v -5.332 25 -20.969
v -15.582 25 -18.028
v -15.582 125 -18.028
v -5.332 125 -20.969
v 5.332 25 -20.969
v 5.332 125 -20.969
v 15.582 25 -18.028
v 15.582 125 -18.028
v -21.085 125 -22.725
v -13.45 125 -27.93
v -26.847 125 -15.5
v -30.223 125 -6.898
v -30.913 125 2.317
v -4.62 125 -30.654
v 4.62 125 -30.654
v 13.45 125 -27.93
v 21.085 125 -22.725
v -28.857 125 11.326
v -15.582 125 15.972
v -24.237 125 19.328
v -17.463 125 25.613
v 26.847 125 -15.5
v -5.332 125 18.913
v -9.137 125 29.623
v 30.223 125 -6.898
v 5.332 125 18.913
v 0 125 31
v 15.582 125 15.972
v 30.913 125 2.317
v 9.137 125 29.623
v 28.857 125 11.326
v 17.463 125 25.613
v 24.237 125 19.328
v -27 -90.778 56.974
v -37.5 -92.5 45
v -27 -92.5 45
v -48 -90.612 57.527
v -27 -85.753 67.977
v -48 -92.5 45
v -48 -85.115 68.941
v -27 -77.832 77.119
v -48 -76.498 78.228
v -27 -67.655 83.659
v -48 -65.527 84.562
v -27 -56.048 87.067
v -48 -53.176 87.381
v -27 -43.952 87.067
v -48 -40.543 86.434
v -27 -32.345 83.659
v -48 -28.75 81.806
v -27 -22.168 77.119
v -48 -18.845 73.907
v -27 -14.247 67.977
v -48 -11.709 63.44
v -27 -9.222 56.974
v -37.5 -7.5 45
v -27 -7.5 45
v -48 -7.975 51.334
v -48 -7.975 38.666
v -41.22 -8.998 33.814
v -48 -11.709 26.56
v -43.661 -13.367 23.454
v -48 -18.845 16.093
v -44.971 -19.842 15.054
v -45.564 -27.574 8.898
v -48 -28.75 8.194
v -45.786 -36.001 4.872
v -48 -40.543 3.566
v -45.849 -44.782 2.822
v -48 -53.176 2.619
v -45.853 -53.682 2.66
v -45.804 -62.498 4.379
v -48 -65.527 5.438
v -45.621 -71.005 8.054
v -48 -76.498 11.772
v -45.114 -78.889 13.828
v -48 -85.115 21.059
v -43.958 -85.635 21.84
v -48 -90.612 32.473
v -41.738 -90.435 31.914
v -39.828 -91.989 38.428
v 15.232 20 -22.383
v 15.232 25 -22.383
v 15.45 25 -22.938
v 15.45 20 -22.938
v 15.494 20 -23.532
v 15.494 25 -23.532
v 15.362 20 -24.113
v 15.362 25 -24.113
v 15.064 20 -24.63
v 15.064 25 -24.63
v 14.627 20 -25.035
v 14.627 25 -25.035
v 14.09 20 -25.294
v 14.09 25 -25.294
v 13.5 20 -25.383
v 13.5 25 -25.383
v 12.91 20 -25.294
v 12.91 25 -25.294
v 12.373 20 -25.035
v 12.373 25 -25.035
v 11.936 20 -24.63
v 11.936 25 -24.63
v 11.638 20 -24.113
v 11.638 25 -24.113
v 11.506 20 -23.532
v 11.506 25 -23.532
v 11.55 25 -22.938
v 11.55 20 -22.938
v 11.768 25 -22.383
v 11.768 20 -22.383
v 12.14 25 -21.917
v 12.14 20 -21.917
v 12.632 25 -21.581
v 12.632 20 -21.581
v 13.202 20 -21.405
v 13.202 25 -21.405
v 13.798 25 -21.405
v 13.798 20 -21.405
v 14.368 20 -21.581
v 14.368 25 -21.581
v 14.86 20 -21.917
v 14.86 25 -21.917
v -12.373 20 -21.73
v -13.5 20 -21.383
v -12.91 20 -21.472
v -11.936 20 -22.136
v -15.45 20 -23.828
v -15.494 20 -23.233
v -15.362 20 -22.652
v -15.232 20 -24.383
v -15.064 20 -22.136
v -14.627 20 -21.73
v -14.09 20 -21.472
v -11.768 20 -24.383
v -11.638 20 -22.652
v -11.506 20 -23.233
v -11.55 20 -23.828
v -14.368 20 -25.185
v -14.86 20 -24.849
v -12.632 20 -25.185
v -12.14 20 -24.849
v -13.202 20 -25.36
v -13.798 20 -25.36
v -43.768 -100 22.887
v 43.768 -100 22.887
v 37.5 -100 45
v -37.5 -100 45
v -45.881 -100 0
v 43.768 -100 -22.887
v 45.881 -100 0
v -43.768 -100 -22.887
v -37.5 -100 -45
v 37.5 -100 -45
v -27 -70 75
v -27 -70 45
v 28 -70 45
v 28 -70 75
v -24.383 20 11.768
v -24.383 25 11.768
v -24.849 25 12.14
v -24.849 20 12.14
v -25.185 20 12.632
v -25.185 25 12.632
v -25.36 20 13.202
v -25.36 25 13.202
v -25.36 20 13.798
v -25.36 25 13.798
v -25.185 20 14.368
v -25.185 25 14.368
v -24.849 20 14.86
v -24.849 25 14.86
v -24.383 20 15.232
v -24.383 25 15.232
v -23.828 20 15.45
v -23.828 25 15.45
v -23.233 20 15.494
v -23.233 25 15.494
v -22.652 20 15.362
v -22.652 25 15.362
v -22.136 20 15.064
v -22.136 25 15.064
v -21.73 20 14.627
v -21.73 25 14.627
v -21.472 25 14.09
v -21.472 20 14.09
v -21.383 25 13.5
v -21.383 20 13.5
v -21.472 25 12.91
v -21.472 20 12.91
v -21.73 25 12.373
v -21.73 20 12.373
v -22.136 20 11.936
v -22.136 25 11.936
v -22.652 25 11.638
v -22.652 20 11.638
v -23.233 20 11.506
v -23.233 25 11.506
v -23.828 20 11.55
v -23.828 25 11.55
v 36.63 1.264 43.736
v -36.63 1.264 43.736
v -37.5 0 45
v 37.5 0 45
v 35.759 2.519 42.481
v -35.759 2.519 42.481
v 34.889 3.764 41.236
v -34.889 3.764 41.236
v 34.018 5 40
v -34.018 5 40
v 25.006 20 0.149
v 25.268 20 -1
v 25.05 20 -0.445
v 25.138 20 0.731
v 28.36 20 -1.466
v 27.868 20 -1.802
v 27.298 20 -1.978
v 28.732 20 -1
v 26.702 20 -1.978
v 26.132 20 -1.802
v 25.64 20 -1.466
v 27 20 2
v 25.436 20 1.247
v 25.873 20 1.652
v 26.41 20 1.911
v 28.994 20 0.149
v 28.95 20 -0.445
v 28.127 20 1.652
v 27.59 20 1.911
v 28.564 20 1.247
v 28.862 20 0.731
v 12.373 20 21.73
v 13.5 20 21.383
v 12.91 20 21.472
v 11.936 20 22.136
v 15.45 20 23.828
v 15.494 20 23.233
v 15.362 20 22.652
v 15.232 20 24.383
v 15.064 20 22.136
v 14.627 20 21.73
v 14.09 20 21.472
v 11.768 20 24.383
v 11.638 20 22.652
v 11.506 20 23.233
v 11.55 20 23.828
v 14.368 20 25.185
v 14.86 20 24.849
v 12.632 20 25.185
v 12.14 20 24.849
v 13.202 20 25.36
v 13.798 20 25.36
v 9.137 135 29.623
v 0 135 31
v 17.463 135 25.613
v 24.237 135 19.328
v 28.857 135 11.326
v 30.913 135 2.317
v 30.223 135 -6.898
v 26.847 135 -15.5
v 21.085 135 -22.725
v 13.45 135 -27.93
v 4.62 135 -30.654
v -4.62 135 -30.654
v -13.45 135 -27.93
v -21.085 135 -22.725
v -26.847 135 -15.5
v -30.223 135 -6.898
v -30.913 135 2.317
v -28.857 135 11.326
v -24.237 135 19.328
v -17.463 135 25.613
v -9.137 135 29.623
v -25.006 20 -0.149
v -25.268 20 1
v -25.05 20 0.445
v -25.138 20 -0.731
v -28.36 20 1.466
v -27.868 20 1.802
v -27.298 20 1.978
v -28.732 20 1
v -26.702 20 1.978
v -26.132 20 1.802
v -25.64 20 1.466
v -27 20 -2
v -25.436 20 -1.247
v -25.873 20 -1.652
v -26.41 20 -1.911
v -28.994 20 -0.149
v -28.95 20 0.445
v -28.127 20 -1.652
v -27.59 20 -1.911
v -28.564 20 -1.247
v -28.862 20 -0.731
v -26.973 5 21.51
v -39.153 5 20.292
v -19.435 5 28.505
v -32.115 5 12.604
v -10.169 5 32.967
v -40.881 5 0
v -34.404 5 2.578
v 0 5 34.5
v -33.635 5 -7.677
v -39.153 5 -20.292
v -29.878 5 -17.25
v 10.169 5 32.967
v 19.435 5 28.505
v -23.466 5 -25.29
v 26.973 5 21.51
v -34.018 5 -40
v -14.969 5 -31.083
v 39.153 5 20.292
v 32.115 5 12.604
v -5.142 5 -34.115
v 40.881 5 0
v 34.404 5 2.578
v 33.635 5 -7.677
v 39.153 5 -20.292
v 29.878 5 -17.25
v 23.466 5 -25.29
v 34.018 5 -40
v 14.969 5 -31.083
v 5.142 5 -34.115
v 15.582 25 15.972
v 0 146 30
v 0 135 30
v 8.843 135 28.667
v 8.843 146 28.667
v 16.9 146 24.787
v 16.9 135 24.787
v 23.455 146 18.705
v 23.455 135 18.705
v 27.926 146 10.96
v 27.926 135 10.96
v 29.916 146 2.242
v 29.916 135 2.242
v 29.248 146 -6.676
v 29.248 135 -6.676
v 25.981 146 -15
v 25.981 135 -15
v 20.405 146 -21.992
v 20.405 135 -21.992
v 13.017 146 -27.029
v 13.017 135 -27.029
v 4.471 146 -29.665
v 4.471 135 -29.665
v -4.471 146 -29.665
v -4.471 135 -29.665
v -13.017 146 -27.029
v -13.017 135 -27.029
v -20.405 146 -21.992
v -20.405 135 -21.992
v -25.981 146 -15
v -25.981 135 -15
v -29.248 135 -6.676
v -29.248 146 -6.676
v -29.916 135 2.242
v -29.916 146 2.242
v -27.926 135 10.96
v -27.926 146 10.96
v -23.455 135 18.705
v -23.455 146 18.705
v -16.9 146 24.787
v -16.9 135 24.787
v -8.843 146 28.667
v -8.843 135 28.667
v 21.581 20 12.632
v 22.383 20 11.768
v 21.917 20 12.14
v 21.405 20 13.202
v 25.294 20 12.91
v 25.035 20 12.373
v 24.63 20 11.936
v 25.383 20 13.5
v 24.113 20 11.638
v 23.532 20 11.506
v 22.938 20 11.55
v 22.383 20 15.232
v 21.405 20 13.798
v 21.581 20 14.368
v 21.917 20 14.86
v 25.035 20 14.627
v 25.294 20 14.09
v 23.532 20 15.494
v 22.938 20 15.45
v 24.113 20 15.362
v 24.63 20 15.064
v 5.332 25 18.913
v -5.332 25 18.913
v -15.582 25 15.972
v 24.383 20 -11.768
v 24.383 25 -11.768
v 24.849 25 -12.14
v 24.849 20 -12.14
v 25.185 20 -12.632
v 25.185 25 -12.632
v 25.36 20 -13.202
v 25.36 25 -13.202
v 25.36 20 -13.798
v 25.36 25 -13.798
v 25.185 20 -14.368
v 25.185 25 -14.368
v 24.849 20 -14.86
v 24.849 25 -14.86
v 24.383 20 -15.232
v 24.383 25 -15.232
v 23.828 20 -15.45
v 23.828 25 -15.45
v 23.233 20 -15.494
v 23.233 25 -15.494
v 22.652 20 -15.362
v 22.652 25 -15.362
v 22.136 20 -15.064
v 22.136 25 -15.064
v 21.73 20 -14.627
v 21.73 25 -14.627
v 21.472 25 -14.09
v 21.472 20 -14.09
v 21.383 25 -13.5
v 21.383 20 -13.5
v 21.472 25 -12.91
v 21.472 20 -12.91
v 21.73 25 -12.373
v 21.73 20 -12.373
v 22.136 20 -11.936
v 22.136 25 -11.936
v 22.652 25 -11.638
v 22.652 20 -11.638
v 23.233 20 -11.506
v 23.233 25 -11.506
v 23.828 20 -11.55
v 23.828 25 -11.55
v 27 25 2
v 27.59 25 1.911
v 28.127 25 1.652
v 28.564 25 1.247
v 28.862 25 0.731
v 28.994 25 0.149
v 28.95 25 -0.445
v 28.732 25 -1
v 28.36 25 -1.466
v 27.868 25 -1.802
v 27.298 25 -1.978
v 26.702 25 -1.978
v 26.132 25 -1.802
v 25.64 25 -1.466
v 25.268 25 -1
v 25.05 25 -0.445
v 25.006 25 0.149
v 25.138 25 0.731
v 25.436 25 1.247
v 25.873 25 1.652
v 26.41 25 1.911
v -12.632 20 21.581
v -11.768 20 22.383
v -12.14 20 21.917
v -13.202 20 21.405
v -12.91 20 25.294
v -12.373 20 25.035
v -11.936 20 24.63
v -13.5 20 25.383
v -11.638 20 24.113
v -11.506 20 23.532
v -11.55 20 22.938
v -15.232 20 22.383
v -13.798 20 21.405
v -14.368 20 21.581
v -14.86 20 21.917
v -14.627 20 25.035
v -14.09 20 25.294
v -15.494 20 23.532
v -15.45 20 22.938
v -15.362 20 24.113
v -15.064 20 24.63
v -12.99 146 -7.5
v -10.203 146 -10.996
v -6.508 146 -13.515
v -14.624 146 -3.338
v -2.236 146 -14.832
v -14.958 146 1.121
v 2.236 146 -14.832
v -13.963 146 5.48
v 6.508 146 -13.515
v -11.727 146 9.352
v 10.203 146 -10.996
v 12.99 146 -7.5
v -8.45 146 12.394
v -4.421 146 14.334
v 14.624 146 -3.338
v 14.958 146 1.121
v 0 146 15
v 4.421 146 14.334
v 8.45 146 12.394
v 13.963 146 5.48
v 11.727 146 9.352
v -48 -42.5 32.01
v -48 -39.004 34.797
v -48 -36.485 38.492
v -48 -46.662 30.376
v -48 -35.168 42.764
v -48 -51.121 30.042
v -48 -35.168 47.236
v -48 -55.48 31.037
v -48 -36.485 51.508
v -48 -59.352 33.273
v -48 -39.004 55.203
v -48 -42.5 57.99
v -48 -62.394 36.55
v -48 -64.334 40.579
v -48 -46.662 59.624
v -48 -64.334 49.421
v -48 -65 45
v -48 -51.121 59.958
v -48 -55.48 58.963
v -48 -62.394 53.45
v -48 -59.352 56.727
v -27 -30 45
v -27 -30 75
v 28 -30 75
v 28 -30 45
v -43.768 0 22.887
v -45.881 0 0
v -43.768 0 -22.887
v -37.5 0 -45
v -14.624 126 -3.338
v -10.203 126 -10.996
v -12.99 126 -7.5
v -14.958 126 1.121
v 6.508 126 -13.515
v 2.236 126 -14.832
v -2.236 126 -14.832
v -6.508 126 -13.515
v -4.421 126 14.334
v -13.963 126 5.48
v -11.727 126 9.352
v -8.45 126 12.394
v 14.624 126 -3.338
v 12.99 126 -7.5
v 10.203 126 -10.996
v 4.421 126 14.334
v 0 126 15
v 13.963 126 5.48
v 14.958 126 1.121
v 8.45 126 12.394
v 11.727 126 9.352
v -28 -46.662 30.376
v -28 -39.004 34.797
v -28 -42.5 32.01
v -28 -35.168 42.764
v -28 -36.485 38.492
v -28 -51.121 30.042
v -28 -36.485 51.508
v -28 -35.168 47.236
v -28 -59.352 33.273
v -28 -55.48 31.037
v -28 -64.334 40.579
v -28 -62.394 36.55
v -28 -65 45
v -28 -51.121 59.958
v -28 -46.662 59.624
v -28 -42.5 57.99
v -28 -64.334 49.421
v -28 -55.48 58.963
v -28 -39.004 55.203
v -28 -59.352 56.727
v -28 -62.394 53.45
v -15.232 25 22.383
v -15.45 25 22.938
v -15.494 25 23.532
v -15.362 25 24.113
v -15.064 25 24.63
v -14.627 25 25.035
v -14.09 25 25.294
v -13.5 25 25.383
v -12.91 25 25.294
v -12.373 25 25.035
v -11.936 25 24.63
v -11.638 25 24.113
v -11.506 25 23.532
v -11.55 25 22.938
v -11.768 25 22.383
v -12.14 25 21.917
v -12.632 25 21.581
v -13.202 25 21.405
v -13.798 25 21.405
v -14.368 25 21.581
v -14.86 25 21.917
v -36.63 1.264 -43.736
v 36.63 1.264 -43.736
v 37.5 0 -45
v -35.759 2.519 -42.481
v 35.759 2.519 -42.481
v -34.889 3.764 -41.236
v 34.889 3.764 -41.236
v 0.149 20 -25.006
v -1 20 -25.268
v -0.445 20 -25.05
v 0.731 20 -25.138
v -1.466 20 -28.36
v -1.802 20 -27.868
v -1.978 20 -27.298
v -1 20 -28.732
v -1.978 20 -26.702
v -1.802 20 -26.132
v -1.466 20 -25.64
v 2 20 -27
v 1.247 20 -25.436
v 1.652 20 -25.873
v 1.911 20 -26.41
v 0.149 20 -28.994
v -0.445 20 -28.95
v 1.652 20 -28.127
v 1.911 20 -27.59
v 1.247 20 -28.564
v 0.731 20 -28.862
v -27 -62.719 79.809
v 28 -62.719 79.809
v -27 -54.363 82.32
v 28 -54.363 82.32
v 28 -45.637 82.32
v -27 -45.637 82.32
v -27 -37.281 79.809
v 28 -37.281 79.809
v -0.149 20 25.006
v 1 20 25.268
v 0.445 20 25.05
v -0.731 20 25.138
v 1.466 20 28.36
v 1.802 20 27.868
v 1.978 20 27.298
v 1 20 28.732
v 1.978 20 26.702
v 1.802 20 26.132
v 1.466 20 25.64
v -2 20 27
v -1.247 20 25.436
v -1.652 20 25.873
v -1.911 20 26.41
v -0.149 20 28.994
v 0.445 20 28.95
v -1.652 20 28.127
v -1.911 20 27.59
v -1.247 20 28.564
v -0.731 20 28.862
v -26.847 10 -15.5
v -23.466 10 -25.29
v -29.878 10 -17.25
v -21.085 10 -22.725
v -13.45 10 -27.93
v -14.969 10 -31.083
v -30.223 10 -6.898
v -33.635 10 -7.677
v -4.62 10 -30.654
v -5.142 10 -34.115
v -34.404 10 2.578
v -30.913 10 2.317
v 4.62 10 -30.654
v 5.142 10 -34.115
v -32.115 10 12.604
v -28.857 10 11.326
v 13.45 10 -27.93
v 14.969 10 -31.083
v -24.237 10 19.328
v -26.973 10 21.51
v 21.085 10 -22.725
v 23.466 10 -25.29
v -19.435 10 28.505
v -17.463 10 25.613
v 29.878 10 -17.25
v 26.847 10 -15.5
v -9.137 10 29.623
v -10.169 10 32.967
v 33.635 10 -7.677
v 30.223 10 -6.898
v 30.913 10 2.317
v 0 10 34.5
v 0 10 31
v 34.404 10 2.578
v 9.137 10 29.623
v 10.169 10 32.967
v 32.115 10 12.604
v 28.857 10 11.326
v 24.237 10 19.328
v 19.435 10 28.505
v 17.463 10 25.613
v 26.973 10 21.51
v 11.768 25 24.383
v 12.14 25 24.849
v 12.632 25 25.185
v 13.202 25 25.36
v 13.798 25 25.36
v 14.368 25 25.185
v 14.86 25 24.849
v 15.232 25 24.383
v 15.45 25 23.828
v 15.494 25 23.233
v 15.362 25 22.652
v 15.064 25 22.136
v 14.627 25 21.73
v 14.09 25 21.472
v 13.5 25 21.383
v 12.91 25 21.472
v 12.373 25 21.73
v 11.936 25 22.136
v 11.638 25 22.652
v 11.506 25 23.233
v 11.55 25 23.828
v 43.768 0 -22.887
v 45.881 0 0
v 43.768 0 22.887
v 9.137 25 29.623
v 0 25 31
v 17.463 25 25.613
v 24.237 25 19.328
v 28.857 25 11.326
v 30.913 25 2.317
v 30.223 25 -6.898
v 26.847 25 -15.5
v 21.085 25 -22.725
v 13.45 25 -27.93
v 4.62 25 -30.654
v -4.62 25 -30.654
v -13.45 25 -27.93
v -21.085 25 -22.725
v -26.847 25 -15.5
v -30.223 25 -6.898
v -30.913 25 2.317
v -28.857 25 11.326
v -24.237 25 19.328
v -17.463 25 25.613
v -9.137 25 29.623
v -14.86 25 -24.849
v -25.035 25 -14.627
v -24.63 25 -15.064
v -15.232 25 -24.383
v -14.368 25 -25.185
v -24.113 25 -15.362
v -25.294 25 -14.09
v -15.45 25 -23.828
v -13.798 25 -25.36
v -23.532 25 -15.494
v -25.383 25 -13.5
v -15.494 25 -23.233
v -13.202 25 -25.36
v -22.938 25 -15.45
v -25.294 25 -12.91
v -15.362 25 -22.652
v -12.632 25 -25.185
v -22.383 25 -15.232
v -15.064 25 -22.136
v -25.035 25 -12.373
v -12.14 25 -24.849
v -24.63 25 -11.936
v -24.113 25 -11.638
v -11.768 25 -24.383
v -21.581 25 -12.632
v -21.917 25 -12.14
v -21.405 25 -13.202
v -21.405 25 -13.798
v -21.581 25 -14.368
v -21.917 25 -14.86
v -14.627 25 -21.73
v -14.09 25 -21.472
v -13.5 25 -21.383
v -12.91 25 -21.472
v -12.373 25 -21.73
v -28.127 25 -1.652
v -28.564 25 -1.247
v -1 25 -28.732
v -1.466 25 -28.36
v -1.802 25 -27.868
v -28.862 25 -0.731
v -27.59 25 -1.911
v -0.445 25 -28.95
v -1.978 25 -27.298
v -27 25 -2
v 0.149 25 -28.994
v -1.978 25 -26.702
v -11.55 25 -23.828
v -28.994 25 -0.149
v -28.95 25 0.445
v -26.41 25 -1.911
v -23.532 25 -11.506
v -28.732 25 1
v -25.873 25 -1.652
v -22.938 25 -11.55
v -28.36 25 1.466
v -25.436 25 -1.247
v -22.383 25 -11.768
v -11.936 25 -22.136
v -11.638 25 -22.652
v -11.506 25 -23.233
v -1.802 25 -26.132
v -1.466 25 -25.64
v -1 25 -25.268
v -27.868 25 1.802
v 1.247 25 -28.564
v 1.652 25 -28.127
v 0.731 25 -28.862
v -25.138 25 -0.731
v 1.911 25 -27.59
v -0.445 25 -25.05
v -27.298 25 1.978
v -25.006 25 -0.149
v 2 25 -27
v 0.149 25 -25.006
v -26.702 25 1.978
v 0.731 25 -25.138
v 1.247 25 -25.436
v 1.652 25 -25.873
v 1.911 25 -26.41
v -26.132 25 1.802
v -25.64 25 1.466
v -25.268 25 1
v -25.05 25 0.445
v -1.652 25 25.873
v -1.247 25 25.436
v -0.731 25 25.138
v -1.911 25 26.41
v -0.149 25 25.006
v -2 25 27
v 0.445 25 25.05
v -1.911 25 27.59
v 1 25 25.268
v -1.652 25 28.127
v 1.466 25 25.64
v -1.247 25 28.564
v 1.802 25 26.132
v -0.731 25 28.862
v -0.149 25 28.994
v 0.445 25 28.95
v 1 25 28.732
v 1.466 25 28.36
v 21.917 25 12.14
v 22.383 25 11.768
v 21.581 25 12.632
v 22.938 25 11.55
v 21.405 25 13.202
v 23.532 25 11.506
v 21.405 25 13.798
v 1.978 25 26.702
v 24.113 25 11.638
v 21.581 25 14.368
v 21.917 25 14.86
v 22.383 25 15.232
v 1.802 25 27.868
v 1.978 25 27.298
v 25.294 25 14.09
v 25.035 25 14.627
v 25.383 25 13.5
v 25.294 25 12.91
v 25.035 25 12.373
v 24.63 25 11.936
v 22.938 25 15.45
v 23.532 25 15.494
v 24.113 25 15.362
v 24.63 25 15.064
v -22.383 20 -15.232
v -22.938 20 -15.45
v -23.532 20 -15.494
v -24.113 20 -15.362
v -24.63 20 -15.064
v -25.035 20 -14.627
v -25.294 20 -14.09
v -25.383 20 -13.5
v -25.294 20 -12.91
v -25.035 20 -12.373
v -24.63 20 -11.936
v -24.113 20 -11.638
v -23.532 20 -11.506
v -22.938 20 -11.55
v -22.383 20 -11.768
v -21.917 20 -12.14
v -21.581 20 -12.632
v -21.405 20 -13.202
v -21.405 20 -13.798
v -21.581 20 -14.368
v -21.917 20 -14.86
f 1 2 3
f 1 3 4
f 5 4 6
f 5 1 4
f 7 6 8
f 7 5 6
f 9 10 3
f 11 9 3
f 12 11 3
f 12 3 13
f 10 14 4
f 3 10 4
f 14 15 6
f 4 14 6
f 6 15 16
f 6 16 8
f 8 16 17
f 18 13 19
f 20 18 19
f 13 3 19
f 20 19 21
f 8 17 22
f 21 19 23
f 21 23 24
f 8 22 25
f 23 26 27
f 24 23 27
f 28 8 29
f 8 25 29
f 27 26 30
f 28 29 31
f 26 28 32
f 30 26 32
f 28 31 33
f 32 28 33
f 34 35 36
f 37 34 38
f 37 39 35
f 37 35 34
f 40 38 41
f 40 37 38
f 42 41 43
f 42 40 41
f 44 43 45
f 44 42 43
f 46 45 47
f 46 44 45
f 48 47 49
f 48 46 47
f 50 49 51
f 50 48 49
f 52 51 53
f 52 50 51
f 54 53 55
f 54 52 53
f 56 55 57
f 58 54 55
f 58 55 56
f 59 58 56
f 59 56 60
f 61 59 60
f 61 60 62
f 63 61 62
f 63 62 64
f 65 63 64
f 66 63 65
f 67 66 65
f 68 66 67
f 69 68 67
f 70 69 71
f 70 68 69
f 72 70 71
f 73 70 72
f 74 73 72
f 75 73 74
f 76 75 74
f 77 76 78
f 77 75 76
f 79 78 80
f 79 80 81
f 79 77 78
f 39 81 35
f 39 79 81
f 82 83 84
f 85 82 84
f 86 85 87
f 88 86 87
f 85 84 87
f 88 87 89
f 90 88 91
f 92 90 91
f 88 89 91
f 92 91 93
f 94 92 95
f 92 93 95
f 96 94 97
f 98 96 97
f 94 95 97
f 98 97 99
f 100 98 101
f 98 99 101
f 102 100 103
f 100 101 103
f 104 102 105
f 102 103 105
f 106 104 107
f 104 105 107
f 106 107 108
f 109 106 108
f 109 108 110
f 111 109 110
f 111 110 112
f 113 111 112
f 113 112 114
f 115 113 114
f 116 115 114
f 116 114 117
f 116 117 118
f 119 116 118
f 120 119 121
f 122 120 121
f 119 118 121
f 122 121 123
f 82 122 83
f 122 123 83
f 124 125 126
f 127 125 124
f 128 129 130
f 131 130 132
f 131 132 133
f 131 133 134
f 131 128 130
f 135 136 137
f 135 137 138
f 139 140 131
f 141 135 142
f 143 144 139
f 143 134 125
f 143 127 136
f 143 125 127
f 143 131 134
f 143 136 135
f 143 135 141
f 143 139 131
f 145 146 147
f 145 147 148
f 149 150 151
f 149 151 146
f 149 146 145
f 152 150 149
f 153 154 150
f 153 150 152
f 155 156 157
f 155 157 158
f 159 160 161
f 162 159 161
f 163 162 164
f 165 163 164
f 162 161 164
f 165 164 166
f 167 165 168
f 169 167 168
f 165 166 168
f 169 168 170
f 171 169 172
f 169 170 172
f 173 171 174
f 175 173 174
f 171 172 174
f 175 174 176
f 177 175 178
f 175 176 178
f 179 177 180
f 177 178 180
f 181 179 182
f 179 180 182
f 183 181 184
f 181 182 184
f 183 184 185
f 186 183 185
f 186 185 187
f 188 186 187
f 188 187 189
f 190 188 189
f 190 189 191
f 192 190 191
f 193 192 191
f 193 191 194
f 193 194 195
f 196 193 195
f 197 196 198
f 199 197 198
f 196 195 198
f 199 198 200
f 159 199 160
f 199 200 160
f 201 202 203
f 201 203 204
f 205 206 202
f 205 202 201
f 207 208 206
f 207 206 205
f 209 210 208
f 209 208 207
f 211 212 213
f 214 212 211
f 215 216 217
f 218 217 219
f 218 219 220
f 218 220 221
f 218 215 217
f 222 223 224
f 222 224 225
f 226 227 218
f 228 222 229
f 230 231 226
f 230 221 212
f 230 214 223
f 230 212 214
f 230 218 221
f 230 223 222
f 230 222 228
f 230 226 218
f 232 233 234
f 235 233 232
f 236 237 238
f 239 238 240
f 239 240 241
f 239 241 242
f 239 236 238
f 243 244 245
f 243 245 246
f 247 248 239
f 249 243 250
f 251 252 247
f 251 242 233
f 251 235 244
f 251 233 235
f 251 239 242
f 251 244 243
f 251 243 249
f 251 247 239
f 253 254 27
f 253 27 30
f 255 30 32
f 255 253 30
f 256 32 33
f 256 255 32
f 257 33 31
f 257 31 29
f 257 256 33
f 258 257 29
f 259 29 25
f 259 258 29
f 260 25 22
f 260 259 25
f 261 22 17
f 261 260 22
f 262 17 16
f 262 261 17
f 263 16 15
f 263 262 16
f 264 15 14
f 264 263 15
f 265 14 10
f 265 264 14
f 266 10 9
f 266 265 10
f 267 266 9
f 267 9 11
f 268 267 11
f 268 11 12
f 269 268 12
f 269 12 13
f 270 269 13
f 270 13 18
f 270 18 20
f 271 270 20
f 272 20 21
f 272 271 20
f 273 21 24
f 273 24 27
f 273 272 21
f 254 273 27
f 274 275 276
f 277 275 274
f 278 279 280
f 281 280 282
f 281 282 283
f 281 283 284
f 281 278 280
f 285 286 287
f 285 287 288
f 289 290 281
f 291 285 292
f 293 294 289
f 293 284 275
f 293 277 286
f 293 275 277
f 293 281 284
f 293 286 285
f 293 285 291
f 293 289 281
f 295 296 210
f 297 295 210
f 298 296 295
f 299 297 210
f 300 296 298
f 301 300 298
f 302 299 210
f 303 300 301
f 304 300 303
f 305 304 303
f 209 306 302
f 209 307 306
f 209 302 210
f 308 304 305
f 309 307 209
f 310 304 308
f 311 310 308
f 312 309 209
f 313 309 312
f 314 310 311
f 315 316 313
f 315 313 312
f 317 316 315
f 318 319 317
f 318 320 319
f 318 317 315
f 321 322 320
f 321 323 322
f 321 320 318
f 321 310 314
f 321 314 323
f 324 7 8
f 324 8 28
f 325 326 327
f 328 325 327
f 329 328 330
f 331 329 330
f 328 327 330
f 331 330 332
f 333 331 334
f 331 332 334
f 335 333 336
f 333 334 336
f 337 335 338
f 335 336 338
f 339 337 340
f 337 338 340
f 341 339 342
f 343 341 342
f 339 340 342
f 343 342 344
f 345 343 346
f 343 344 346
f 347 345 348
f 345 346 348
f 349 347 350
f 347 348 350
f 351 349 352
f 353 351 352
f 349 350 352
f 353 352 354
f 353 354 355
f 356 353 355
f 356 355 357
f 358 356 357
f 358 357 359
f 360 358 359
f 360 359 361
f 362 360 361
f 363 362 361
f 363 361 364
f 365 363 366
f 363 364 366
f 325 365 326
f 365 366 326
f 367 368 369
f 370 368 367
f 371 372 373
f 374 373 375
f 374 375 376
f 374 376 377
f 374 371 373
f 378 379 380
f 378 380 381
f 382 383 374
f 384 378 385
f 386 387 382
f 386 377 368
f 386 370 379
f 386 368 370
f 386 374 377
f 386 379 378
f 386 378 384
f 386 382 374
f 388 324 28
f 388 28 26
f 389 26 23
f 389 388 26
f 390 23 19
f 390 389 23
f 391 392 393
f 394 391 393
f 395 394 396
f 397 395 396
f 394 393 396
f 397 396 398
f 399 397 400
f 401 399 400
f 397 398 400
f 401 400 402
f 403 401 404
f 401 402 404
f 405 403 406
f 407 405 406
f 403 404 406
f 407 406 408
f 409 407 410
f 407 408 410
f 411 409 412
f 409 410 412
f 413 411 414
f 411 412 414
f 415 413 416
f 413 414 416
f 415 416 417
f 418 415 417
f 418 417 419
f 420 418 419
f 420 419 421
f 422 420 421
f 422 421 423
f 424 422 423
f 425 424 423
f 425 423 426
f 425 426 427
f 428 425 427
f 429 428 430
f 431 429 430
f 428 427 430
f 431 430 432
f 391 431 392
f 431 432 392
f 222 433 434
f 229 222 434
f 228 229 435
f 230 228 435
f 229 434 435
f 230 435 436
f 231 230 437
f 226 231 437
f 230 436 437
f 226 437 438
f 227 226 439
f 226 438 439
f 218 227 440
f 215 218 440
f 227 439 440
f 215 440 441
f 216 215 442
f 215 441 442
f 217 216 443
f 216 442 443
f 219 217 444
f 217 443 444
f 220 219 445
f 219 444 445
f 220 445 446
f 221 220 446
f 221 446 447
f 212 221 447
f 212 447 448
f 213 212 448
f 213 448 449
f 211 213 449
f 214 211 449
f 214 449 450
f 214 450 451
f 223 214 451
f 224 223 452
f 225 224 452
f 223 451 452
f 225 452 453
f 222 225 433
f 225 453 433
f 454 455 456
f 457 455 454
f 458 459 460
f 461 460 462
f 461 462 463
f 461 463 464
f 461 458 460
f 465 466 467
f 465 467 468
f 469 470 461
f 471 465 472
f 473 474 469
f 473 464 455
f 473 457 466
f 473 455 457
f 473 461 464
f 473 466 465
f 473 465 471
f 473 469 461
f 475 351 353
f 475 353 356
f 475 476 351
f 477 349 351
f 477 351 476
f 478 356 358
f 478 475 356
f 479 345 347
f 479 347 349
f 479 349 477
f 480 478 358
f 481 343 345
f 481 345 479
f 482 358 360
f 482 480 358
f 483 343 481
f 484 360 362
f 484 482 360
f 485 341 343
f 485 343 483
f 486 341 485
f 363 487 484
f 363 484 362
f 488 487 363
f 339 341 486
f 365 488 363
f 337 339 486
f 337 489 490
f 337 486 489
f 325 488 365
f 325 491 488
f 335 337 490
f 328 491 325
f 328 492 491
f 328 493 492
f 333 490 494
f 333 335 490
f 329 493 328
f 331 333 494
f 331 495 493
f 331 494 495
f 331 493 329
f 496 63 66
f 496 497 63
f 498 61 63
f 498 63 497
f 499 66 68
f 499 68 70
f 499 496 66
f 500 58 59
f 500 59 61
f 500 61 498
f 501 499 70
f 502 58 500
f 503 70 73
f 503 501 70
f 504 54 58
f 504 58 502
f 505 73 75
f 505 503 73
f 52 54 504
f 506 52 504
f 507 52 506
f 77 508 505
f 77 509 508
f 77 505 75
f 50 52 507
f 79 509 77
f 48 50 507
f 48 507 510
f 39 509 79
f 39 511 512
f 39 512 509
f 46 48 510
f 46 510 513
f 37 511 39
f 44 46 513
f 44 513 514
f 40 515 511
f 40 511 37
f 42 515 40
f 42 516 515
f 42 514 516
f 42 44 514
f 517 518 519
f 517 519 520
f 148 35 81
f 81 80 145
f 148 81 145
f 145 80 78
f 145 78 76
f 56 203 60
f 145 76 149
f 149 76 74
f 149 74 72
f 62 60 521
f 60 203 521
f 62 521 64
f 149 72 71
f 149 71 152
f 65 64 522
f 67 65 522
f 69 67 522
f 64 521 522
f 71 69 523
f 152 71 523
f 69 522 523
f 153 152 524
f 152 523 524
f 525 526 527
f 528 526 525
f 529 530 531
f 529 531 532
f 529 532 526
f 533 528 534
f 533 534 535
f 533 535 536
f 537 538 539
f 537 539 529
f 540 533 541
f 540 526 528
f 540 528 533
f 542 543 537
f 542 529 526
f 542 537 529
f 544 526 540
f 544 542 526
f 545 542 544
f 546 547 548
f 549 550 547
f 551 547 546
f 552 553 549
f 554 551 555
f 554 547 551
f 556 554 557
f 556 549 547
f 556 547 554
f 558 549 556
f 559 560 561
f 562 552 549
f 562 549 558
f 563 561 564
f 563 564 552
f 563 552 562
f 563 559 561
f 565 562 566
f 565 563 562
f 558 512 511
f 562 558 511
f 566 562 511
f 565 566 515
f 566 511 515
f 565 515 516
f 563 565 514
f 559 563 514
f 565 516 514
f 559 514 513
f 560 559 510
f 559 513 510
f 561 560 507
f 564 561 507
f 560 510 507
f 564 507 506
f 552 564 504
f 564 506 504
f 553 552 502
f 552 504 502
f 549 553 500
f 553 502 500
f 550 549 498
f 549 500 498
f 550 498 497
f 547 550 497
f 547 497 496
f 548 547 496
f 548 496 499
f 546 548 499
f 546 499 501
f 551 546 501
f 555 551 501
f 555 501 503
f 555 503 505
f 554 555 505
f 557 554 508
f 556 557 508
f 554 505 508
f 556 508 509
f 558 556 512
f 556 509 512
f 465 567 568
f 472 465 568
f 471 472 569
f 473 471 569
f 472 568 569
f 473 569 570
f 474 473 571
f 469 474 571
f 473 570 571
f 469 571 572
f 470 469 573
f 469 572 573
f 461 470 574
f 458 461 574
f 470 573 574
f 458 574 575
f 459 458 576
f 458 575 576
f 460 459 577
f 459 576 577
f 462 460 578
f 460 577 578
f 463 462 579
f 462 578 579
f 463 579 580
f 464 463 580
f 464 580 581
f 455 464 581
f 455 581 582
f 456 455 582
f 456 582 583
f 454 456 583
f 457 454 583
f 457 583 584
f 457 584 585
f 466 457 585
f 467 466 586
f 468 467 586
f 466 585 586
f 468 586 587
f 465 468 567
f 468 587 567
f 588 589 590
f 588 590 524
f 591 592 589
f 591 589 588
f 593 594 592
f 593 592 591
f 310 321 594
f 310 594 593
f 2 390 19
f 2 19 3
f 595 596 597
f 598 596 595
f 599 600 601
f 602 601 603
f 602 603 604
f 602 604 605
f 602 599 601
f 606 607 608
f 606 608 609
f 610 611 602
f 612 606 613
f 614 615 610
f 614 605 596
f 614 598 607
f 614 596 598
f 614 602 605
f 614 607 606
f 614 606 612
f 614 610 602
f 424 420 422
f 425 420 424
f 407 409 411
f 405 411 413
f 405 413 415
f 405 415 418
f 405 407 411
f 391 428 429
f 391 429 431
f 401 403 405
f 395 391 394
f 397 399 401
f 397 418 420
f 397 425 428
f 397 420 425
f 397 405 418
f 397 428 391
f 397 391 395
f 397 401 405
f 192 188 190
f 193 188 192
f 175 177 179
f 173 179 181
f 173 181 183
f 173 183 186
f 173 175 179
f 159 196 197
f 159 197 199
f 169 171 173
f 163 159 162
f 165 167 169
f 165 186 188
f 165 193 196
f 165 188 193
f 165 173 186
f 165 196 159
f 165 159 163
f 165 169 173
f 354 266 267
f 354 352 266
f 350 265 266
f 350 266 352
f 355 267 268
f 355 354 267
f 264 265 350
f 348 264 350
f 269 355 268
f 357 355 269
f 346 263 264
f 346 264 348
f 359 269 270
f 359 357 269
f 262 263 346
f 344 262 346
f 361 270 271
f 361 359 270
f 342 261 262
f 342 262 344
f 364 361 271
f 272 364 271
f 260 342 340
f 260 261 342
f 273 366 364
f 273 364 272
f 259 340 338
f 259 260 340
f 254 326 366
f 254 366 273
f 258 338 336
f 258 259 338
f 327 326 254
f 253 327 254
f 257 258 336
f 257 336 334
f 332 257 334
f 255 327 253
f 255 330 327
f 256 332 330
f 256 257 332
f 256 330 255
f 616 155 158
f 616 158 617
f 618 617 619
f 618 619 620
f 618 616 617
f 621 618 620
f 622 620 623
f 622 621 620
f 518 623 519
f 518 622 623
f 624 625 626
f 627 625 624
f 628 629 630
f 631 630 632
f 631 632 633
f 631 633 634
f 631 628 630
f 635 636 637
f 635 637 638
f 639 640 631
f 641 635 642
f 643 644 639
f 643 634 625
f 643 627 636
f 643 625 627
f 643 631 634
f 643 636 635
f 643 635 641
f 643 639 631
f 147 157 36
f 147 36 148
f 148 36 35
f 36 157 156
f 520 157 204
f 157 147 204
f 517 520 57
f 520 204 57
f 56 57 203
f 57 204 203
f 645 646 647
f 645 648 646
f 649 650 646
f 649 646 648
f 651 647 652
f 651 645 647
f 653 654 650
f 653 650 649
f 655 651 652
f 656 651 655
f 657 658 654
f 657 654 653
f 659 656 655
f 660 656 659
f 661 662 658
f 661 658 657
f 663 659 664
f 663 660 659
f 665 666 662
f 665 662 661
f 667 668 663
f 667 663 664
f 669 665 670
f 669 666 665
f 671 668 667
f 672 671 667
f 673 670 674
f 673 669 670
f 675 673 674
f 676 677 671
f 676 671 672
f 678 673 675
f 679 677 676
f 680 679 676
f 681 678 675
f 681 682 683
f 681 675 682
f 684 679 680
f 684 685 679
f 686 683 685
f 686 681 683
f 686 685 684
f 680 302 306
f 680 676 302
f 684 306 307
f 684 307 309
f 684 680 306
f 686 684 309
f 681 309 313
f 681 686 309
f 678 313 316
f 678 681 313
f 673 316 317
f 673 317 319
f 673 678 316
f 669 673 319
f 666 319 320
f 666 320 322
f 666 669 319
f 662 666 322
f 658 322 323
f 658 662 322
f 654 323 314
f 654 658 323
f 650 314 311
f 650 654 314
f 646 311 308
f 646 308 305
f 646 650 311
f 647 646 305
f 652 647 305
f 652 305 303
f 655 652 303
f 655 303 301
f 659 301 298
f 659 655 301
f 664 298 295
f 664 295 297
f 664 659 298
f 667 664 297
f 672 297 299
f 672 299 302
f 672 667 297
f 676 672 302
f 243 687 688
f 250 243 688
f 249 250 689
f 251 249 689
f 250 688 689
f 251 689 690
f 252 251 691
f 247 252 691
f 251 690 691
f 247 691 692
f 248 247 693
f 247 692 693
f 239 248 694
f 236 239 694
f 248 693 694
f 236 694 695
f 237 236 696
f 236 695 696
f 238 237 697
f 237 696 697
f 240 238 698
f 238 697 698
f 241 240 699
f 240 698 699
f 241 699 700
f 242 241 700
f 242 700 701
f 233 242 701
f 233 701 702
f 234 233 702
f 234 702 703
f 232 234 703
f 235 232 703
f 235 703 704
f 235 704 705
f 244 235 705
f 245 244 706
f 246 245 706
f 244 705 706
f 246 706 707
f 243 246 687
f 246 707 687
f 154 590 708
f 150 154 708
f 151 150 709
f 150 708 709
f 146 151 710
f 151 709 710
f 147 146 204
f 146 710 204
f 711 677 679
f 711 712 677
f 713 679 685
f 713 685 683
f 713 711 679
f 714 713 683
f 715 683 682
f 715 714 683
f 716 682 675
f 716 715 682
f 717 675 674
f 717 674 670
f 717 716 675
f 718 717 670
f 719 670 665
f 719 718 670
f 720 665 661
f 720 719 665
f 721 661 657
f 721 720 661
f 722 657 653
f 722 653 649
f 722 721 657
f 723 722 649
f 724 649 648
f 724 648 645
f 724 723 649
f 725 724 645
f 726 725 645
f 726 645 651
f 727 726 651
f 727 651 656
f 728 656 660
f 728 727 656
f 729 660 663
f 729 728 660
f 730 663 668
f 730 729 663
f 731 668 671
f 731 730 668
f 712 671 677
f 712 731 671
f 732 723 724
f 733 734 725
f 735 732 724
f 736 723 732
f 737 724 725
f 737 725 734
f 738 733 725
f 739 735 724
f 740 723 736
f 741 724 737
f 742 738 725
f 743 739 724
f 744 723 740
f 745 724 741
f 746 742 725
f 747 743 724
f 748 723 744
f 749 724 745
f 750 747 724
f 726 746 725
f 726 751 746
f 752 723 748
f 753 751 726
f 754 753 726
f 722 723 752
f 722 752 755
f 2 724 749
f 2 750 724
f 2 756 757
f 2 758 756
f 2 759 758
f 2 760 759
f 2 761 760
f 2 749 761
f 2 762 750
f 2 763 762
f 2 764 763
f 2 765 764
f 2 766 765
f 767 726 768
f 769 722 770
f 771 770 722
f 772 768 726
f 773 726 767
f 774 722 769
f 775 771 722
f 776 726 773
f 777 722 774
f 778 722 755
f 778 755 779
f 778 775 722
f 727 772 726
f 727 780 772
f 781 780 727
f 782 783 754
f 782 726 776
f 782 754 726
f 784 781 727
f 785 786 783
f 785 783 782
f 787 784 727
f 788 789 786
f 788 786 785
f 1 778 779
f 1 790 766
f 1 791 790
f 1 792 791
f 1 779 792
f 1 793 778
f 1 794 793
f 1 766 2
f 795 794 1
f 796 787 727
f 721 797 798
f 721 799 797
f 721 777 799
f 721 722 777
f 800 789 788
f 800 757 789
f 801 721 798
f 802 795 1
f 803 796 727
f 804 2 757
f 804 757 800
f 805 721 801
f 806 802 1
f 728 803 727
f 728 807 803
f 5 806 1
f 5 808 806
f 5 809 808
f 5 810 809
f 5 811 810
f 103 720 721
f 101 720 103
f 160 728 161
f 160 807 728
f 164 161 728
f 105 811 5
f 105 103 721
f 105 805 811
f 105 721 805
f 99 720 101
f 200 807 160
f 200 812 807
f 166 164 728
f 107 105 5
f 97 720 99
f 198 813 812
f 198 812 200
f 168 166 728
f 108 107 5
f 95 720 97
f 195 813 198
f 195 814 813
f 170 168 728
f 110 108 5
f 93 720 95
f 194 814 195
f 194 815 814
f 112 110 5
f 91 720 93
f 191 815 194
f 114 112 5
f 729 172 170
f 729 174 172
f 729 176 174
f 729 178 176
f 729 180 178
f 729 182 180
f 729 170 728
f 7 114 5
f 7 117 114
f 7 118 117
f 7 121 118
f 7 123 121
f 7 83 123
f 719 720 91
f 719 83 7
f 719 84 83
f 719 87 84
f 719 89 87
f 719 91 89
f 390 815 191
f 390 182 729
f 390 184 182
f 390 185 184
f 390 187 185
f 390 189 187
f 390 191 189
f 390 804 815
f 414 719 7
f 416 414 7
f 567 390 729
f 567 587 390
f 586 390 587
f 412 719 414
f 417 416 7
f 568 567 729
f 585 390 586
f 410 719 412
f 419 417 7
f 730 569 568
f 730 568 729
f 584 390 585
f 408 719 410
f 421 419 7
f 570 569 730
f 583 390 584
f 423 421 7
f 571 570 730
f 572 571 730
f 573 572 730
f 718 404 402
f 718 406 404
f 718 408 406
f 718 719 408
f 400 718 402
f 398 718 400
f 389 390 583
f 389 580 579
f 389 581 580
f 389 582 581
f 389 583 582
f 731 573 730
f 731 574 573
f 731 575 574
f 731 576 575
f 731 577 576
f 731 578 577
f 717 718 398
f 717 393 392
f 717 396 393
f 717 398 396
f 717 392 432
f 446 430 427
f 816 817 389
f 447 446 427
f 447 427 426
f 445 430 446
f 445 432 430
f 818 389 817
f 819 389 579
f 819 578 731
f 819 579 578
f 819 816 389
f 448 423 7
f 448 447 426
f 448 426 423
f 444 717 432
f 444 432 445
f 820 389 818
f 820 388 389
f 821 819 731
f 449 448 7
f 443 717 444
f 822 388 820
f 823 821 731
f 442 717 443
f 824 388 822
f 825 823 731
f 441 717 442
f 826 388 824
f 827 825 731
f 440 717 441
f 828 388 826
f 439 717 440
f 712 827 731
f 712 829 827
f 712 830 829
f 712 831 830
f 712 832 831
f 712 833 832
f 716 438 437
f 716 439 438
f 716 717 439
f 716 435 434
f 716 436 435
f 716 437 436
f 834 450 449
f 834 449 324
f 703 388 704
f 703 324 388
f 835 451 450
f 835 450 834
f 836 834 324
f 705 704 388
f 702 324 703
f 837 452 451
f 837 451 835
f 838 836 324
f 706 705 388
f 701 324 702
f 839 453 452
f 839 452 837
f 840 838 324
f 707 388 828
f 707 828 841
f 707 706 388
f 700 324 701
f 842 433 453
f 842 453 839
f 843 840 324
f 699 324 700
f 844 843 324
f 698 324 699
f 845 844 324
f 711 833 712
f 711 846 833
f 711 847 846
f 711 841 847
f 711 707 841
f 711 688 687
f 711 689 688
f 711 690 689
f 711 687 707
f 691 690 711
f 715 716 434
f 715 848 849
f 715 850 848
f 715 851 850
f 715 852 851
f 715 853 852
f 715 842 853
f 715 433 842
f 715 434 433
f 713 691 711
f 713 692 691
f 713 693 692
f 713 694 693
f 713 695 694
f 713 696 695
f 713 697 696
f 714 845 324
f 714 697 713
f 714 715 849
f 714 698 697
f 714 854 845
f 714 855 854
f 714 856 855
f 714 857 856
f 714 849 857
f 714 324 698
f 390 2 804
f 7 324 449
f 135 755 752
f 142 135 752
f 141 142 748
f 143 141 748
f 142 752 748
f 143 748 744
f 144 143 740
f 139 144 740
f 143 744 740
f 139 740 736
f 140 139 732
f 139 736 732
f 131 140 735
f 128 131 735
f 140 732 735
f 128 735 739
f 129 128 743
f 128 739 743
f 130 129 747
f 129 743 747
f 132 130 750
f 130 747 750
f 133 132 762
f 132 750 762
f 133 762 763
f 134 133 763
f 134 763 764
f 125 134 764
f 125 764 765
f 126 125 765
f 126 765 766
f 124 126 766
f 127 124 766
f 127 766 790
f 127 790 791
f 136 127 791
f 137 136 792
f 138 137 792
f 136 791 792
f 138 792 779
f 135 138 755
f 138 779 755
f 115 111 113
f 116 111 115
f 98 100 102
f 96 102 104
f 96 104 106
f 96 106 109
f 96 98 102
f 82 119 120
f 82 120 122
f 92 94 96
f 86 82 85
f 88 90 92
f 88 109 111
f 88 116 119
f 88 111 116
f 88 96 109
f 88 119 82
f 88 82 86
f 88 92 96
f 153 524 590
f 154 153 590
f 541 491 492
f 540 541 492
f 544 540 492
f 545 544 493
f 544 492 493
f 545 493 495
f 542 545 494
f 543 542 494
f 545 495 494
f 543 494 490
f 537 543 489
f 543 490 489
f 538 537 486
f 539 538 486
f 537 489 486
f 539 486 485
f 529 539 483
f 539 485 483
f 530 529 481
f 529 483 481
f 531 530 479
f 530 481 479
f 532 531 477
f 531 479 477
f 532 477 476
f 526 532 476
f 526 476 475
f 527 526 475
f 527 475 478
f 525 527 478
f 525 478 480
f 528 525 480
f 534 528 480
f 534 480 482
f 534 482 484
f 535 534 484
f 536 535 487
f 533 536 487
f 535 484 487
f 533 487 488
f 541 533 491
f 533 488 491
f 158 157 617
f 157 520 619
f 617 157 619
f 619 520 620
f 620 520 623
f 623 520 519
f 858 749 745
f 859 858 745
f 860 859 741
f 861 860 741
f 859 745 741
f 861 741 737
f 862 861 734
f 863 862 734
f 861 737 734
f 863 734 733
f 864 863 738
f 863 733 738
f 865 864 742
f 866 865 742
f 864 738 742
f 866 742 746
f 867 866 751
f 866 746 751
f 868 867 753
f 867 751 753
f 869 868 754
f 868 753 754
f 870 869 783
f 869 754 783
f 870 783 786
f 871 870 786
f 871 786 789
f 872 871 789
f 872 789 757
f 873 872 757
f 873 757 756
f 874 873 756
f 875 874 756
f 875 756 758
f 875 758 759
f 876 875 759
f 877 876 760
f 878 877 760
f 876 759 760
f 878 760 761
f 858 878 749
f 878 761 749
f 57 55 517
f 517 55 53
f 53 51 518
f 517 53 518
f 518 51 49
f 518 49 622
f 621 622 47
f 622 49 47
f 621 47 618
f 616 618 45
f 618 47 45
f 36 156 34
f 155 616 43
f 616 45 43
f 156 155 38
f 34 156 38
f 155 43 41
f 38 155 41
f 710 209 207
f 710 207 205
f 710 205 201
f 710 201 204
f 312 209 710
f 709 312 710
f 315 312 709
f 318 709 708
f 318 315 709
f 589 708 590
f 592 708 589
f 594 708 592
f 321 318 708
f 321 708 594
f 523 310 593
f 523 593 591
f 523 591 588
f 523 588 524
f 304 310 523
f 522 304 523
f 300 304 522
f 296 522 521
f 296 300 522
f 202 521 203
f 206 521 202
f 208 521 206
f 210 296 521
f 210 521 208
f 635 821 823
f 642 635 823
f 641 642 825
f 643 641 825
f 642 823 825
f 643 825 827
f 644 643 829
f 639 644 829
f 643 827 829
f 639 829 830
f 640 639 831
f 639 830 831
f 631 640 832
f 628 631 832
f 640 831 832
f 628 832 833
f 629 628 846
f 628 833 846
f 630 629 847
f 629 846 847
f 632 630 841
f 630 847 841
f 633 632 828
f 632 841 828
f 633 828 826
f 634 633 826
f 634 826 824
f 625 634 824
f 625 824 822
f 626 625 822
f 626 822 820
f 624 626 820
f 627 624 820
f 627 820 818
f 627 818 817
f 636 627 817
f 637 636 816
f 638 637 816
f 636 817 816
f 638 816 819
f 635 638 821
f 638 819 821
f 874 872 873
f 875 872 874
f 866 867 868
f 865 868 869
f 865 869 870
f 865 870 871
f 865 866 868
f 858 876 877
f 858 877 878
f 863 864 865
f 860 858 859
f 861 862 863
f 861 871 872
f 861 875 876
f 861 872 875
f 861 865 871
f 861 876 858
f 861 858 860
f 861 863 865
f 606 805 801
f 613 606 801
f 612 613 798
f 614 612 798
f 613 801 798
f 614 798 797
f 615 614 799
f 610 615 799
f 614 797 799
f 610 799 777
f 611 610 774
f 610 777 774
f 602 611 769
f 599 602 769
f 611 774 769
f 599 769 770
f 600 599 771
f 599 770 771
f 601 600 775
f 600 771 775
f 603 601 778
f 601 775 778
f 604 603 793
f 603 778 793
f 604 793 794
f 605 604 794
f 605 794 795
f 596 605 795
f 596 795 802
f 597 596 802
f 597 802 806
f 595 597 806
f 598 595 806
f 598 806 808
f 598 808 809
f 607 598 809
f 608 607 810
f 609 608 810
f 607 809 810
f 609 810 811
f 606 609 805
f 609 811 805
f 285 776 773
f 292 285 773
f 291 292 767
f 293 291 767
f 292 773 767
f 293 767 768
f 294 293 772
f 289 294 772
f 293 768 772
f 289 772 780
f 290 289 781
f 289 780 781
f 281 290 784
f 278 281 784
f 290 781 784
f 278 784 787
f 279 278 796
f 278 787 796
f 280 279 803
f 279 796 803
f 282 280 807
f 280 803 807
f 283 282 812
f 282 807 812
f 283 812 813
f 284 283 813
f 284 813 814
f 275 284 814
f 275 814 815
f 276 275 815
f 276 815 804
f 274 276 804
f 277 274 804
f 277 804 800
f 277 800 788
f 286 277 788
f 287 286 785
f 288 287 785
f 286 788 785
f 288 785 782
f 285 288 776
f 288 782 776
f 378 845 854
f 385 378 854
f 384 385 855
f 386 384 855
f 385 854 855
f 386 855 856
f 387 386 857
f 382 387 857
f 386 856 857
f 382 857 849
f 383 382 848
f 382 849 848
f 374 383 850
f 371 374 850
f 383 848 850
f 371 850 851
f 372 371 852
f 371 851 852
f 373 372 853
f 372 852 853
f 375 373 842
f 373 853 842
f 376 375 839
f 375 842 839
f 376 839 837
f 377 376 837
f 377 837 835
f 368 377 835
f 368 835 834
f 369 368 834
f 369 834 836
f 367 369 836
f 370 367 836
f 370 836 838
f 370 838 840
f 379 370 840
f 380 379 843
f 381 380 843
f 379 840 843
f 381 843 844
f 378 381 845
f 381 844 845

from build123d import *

# Parameters (mm, degrees)
Y_KSEKLIK_EKSTR_ZYON1_DEPTH = 100
Y_KSEKLIK_EKSTR_ZYON2_DEPTH = 5
Y_KSEKLIK_EKSTR_ZYON2_DRAFT = 45
IZIM6_R                     = 34.5
Y_KSEKLIK_EKSTR_ZYON3_DEPTH = 5
IZIM7_R                     = 31
Y_KSEKLIK_EKSTR_ZYON4_DEPTH = 15
IZIM8_R                     = 2
KES_EKSTR_ZYON1_DEPTH       = 5
DAIRESEL_KAPLAMA1_COUNT     = 12
Y_KSEKLIK_EKSTR_ZYON5_DEPTH = 100
Y_KSEKLIK_EKSTR_ZYON6_START = 10
IZIM11_R                    = 31
Y_KSEKLIK_EKSTR_ZYON6_DEPTH = 10
IZIM12_R                    = 30
Y_KSEKLIK_EKSTR_ZYON7_DEPTH = 11
IZIM13_R                    = 42.5
Y_KSEKLIK_EKSTR_ZYON8_DEPTH = 10.5
Y_KSEKLIK_EKSTR_ZYON9_DEPTH = 55
IZIM17_R                    = 15
KES_EKSTR_ZYON2_DEPTH       = 20
IZIM18_R                    = 15
KES_EKSTR_ZYON3_DEPTH       = 20


# Read off the part's stored shape, not the designer's step: Yükseklik-Ekstrüzyon2
with BuildPart() as part:
    # Çizim1 → Yükseklik-Ekstrüzyon1 (new body)
    with BuildSketch(Plane(origin=(0, 0, 0), x_dir=(1, 0, 0), z_dir=(0, 1, 0))):
        with BuildLine():
            Line((-37.5, 45), (37.5, 45))
            ThreePointArc((37.5, 45), (45.880962103, 0), (37.5, -45))
            Line((37.5, -45), (-37.5, -45))
            ThreePointArc((-37.5, -45), (-45.880962103, 0), (-37.5, 45))
        make_face()
    extrude(amount=-Y_KSEKLIK_EKSTR_ZYON1_DEPTH)


with BuildPart() as y_kseklik_ekstr_zyon2_tool:
    # Yükseklik-Ekstrüzyon2 outline → Yükseklik-Ekstrüzyon2 (with draft: the straight prism first)
    with BuildSketch(Plane(origin=(0, 5, 0), x_dir=(1, 0, 0), z_dir=(0, 1, 0))):
        with BuildLine():
            ThreePointArc((-34.018047093, 40), (-40.880962103, 0), (-34.018047093, -40))
            Line((-34.018047093, -40), (34.018047093, -40))
            ThreePointArc((34.018047093, -40), (40.880962103, 0), (34.018047093, 40))
            Line((34.018047093, 40), (-34.018047093, 40))
        make_face()
    extrude(amount=-Y_KSEKLIK_EKSTR_ZYON2_DEPTH)
    # Yükseklik-Ekstrüzyon2: the draft: its side faces are tilted about the plane it starts from
    y_kseklik_ekstr_zyon2_sides = [y_kseklik_ekstr_zyon2_tool.faces().sort_by_distance(p)[0] for p in [
        (0, 2.5, -40),
        (-40.880962103, 2.5, 0),
        (0, 2.5, 40),
        (40.880962103, 2.5, 0),
    ]]
    draft(y_kseklik_ekstr_zyon2_sides, Plane(origin=(0, 5, 0), x_dir=(1, 0, 0), z_dir=(0, 1, 0)), Y_KSEKLIK_EKSTR_ZYON2_DRAFT)


with BuildPart() as part_1:
    add(part.part)

    # Yükseklik-Ekstrüzyon2: add y_kseklik_ekstr_zyon2_tool
    add(y_kseklik_ekstr_zyon2_tool.part)

    # Çizim6 → Yükseklik-Ekstrüzyon3 (add, symmetric)
    with BuildSketch(Plane(origin=(0, 5, 0), x_dir=(1, 0, 0), z_dir=(0, 1, 0))):
        with Locations(Location((0, 0, 0), (0, 0, 270))):
            Circle(IZIM6_R)
    extrude(amount=Y_KSEKLIK_EKSTR_ZYON3_DEPTH, both=True)

    # Çizim7 → Yükseklik-Ekstrüzyon4 (add, symmetric)
    with BuildSketch(Plane(origin=(0, 10, 0), x_dir=(1, 0, 0), z_dir=(0, 1, 0))):
        with Locations(Location((0, 0, 0), (0, 0, 270))):
            Circle(IZIM7_R)
    extrude(amount=Y_KSEKLIK_EKSTR_ZYON4_DEPTH, both=True)

    # Çizim8 → Kes-Ekstrüzyon1 (cut)
    with BuildSketch(Plane(origin=(0, 25, 0), x_dir=(1, 0, 0), z_dir=(0, 1, 0))):
        with Locations(Location((27, 0, 0), (0, 0, 270))):
            Circle(IZIM8_R)
    kes_ekstr_zyon1 = extrude(amount=-KES_EKSTR_ZYON1_DEPTH, mode=Mode.SUBTRACT)

    # Dairesel Kaplama1: Kes-Ekstrüzyon1 ×12 about axis
    dairesel_kaplama1_axis = Axis((0, 0, 0), (0, 1, 0))
    for i in range(1, DAIRESEL_KAPLAMA1_COUNT):
        add(kes_ekstr_zyon1.rotate(dairesel_kaplama1_axis, i * 360 / DAIRESEL_KAPLAMA1_COUNT), mode=Mode.SUBTRACT)

    # Çizim10 → Yükseklik-Ekstrüzyon5 (add)
    with BuildSketch(Plane(origin=(0, 25, 0), x_dir=(1, 0, 0), z_dir=(0, 1, 0))):
        with BuildLine():
            Line((-15.581702618, -15.971995333), (-15.581702618, 18.028004667))
            ThreePointArc((-15.581702618, 18.028004667), (0, 21.342270575), (15.581702618, 18.028004667))
            Line((15.581702618, 18.028004667), (15.581702618, -15.971995333))
            ThreePointArc((15.581702618, -15.971995333), (0, -19.28626124), (-15.581702618, -15.971995333))
        make_face()
    extrude(amount=Y_KSEKLIK_EKSTR_ZYON5_DEPTH)

    # Çizim11 → Yükseklik-Ekstrüzyon6 (add)
    with BuildSketch(Plane(origin=(0, 125, 0), x_dir=(1, 0, 0), z_dir=(0, 1, 0)).offset(Y_KSEKLIK_EKSTR_ZYON6_START)):
        with Locations(Location((0, 0, 0), (0, 0, 270))):
            Circle(IZIM11_R)
    extrude(amount=-Y_KSEKLIK_EKSTR_ZYON6_DEPTH)

    # Çizim12 → Yükseklik-Ekstrüzyon7 (add)
    with BuildSketch(Plane(origin=(0, 135, 0), x_dir=(1, 0, 0), z_dir=(0, 1, 0))):
        with Locations(Location((0, 0, 0), (0, 0, 270))):
            Circle(IZIM12_R)
    extrude(amount=Y_KSEKLIK_EKSTR_ZYON7_DEPTH)

    # Çizim13 → Yükseklik-Ekstrüzyon8 (add, symmetric)
    with BuildSketch(Plane.ZY.offset(37.5)):
        with Locations(Location((45, -50, 0), (0, 0, 270))):
            Circle(IZIM13_R)
    extrude(amount=Y_KSEKLIK_EKSTR_ZYON8_DEPTH, both=True)

    # Çizim16 → Yükseklik-Ekstrüzyon9 (add)
    with BuildSketch(Plane(origin=(-27, 0, 0), x_dir=(0, 0, -1), z_dir=(1, 0, 0))):
        with BuildLine():
            Line((-45, -30), (-45, -70))
            Line((-45, -70), (-75, -70))
            ThreePointArc((-75, -70), (-82.639320225, -50), (-75, -30))
            Line((-75, -30), (-45, -30))
        make_face()
    extrude(amount=Y_KSEKLIK_EKSTR_ZYON9_DEPTH)

    # Çizim17 → Kes-Ekstrüzyon2 (cut)
    with BuildSketch(Plane(origin=(0, 146, 0), x_dir=(1, 0, 0), z_dir=(0, 1, 0))):
        with Locations(Location((0, 0, 0), (0, 0, 270))):
            Circle(IZIM17_R)
    extrude(amount=-KES_EKSTR_ZYON2_DEPTH, mode=Mode.SUBTRACT)

    # Çizim18 → Kes-Ekstrüzyon3 (cut)
    with BuildSketch(Plane.ZY.offset(48)):
        with Locations(Location((45, -50, 0), (0, 0, 270))):
            Circle(IZIM18_R)
    extrude(amount=-KES_EKSTR_ZYON3_DEPTH, mode=Mode.SUBTRACT)


solid = part_1.part
